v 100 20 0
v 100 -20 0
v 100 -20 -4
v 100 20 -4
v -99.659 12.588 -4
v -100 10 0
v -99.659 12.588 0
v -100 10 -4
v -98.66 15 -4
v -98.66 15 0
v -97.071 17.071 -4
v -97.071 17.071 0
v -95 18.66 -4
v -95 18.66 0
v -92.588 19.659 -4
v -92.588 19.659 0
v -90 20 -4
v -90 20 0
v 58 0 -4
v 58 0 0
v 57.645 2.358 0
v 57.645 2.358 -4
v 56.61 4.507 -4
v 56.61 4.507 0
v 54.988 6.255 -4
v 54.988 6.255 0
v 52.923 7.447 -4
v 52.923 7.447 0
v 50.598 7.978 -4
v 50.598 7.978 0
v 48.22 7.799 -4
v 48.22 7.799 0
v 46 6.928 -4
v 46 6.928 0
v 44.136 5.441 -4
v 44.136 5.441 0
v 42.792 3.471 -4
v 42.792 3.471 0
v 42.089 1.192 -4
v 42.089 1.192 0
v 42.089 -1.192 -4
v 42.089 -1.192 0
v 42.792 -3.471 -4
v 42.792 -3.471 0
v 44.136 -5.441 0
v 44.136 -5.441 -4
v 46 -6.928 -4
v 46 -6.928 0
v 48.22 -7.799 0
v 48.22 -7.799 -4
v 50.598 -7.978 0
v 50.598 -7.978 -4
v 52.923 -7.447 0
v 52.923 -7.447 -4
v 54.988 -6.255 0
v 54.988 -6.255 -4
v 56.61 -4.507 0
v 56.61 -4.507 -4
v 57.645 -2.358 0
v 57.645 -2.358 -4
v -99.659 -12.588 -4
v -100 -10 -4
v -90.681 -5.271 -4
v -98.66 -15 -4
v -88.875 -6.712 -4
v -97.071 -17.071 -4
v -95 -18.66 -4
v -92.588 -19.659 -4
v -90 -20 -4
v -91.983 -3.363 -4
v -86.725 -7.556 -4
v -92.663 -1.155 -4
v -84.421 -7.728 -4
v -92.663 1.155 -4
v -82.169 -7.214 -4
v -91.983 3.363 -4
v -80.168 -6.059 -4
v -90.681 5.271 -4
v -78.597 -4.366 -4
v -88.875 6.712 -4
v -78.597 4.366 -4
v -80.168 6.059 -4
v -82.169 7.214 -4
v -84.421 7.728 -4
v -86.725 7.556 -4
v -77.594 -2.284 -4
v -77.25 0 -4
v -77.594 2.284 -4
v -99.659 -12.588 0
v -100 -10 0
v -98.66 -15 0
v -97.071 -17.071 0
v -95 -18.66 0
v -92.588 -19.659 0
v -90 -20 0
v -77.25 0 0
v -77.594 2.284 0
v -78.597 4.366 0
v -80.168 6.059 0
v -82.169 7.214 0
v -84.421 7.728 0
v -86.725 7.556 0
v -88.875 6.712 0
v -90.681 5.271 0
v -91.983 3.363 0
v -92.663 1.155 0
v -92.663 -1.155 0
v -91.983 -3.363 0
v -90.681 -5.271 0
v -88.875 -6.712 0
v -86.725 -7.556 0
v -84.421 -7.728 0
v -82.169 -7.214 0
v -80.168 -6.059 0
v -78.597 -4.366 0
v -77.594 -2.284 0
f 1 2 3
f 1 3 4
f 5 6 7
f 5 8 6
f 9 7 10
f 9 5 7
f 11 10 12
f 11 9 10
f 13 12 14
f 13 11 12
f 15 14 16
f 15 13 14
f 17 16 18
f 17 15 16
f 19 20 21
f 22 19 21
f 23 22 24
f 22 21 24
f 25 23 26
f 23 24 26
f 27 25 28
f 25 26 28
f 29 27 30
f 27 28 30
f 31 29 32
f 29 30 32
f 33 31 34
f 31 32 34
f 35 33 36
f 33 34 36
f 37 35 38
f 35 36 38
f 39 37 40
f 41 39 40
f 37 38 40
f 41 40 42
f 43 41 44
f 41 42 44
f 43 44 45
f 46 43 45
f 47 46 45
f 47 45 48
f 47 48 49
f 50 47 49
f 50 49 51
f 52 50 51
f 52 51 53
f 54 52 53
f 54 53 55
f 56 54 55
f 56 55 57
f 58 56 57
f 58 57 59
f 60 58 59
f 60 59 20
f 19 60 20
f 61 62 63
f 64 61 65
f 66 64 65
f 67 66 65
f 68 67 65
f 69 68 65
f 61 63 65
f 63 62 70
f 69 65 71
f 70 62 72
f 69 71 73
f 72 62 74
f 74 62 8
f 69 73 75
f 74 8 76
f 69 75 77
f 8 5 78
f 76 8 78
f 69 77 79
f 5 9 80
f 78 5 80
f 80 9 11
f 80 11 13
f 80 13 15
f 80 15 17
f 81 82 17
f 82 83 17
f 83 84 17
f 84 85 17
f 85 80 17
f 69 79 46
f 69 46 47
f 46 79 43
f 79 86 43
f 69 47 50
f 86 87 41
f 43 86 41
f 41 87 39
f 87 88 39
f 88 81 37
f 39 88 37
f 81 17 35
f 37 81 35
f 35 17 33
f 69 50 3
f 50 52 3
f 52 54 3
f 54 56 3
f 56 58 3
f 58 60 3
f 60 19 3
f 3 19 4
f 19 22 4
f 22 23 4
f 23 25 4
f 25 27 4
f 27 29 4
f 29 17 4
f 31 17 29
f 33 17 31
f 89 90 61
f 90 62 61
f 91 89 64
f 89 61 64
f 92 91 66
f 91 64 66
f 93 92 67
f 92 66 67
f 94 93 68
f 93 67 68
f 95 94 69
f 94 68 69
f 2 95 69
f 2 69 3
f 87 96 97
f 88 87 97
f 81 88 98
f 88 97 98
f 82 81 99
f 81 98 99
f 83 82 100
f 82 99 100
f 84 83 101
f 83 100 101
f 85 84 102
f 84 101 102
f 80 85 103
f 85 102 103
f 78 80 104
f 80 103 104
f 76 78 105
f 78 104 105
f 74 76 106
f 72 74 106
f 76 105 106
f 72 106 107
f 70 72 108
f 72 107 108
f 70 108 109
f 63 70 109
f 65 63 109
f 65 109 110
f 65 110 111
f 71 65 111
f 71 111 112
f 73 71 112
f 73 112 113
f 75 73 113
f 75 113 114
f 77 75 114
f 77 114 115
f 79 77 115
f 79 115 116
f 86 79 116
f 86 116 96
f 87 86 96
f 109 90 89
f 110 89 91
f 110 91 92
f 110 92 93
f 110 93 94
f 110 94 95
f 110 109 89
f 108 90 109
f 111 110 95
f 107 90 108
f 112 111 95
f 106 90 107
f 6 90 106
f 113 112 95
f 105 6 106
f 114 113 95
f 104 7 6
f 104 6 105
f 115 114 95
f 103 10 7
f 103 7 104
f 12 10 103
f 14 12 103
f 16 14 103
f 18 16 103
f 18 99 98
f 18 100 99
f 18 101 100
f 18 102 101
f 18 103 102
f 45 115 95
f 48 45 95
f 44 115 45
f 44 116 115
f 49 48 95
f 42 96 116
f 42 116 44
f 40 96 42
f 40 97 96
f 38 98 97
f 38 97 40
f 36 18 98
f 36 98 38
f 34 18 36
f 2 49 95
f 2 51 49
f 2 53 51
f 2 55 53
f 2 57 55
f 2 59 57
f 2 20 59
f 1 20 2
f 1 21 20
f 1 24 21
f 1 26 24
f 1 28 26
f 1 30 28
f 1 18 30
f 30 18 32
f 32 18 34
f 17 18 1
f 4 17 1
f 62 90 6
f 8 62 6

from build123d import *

# Parameters (mm, degrees)
IZIM1_W               = 200
IZIM1_H               = 40
TABAN_FLAN_1_DEPTH    = 4
IZIM6_R               = 7.75
IZIM6_R_2             = 8
KES_EKSTR_ZYON1_DEPTH = 10
RADYUS1_R             = 10


# Sheet-metal steps are written as plain solids
with BuildPart() as part:
    # Çizim1 → Taban-Flanş1 (new body)
    with BuildSketch(Plane.XY):
        Rectangle(IZIM1_W, IZIM1_H)
    extrude(amount=-TABAN_FLAN_1_DEPTH)

    # Çizim6 → Kes-Ekstrüzyon1 (cut)
    with BuildSketch(Plane.XY):
        with Locations((-85, 0)):
            Circle(IZIM6_R)
        with Locations((50, 0)):
            Circle(IZIM6_R_2)
    extrude(amount=-KES_EKSTR_ZYON1_DEPTH, mode=Mode.SUBTRACT)

    # Radyus1
    radyus1_edges = [part.edges().sort_by_distance(p)[0] for p in [
        (-100, -20, -2),
        (-100, 20, -2),
    ]]
    fillet(radyus1_edges, radius=RADYUS1_R)


solid = part.part
